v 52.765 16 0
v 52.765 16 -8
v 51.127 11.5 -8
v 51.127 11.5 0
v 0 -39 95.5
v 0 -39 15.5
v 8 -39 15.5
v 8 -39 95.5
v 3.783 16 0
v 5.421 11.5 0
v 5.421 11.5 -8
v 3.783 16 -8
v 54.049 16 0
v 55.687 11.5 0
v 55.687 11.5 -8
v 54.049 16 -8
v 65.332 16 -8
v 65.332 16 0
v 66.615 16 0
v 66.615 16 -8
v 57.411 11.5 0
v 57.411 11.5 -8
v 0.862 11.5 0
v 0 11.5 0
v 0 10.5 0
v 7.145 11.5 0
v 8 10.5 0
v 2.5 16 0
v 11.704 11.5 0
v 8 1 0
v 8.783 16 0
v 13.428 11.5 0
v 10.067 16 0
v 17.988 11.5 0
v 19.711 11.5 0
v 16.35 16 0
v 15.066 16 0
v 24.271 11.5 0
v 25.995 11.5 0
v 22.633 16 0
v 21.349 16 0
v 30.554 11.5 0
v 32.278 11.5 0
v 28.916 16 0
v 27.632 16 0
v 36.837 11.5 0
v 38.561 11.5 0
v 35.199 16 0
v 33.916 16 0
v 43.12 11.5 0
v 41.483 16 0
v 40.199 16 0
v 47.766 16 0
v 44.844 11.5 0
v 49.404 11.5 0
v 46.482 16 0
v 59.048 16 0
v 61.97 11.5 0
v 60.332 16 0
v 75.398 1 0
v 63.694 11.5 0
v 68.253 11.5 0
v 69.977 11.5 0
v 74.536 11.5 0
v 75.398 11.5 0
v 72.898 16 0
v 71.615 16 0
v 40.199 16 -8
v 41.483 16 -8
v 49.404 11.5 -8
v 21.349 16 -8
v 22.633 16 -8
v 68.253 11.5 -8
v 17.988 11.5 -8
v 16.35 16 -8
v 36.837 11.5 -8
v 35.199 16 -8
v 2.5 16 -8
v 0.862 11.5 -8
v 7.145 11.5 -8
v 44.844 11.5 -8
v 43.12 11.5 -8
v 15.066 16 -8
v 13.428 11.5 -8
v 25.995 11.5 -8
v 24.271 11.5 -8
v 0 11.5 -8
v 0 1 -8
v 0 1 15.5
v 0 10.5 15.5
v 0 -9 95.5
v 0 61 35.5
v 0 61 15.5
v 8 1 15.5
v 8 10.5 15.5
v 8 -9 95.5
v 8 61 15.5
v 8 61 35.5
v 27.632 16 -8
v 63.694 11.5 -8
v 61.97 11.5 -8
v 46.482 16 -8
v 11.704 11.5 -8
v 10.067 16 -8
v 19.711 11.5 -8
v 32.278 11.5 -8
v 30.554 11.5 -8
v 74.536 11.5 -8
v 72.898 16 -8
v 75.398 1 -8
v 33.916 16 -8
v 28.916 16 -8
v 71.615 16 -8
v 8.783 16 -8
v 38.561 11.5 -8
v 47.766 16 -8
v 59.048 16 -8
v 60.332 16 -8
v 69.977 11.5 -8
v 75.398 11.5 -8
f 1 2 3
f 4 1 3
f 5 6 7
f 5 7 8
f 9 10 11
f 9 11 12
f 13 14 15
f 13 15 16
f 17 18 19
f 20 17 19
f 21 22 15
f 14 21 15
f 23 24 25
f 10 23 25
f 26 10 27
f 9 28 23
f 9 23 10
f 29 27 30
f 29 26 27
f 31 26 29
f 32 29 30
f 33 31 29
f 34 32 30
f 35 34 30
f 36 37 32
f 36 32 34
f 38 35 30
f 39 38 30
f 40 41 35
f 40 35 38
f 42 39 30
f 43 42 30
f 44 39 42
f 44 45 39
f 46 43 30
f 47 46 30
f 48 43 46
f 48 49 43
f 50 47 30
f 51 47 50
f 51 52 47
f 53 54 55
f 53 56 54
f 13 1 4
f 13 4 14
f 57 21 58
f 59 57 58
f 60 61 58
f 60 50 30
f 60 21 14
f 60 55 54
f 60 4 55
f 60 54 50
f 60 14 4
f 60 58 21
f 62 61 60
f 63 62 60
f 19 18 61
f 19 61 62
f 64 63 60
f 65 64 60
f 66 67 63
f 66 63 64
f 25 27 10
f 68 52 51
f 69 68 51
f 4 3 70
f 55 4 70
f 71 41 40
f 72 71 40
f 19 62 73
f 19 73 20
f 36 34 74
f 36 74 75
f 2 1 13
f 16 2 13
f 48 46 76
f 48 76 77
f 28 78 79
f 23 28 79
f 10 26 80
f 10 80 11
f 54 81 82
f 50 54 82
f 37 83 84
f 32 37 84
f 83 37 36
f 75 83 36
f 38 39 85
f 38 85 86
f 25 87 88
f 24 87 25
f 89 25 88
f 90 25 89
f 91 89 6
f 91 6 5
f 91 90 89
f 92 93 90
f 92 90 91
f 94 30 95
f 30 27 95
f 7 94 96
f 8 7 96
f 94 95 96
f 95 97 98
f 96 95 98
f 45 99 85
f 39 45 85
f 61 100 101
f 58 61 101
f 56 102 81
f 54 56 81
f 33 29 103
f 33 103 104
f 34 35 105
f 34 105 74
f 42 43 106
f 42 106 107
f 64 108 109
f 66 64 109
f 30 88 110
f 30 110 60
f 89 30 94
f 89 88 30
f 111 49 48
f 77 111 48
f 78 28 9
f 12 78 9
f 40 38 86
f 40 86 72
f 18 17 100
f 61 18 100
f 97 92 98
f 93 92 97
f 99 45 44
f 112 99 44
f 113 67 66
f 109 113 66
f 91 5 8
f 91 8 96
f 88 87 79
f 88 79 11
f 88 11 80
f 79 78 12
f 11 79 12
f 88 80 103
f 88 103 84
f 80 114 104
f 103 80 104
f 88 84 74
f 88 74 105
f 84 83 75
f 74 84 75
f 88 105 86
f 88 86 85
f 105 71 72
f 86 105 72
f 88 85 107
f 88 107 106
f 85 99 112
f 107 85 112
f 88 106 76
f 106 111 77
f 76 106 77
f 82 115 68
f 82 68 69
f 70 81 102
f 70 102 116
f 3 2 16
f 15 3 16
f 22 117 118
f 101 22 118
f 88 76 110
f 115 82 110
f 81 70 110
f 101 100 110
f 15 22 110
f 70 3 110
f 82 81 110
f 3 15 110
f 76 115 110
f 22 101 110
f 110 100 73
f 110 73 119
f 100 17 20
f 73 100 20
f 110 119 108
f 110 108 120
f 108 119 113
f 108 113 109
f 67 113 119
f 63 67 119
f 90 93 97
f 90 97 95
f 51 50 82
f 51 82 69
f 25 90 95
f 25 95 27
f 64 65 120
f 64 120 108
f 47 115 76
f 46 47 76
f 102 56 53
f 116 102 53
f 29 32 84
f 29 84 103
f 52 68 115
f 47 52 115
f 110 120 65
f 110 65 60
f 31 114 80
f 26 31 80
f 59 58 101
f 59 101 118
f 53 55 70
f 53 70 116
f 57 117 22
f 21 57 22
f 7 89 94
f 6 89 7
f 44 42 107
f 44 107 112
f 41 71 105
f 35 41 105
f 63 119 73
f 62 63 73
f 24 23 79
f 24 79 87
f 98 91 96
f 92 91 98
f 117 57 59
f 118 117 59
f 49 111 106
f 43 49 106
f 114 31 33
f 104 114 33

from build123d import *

# Parameters (mm, degrees)
BLANKSKE_W          = 120
BLANKSKE_H          = 16
BLANK_DEPTH         = 8
TOOTHCUTSIM_DEPTH   = 122.326007105
TEETHCUTS_COUNT     = 20
TEETHCUTS_PITCH     = 6.2831853
SKETCH1_W           = 8
SKETCH1_H           = 1
CUT_EXTRUDE1_DEPTH  = 122.326007105
BOSS_EXTRUDE2_DEPTH = 8
CUT_EXTRUDE2_DEPTH  = 170.803562978


with BuildPart() as part:
    # BlankSke → Blank (new body)
    with BuildSketch(Plane.XY):
        with Locations((60, 8)):
            Rectangle(BLANKSKE_W, BLANKSKE_H)
    extrude(amount=-BLANK_DEPTH)

    # TooCutSkeSim → ToothCutSim (cut, through all)
    with BuildSketch(Plane.XY):
        Polygon((0.861870739, 11.5), (-0.861870739, 11.5), (-2.508981637, 16.0254), (2.508981637, 16.0254), align=None)
    toothcutsim = extrude(amount=-TOOTHCUTSIM_DEPTH, mode=Mode.SUBTRACT)

    # TeethCuts: ToothCutSim ×20
    with Locations(*[(i * TEETHCUTS_PITCH, 0, 0) for i in range(1, TEETHCUTS_COUNT)]):
        add(toothcutsim, mode=Mode.SUBTRACT)

    # Sketch1 → Cut-Extrude1 (cut, through all)
    with BuildSketch(Plane(origin=(120, 0, 0), x_dir=(0, 0, -1), z_dir=(1, 0, 0))):
        with Locations((4, 0.5)):
            Rectangle(SKETCH1_W, SKETCH1_H)
    extrude(amount=-CUT_EXTRUDE1_DEPTH, mode=Mode.SUBTRACT)

    # Sketch3 → Boss-Extrude2 (add)
    with BuildSketch(Plane.ZY):
        Polygon((0, 1), (15.5, 1), (15.5, -39), (95.5, -39), (95.5, -9), (35.5, 61), (15.5, 61), (15.5, 10.5), (0, 10.5), align=None)
    extrude(amount=-BOSS_EXTRUDE2_DEPTH)

    # Sketch4 → Cut-Extrude2 (cut, through all)
    with BuildSketch(Plane(origin=(0, 0, -8), x_dir=(-1, 0, 0), z_dir=(0, 0, -1))):
        Polygon((-120, 11.5), (-118.518649961, 11.5), (-116.880783906, 16), (-115.597072194, 16), (-113.959206139, 11.5), (-113.218706139, 11.5), (-112.235464661, 11.5), (-110.597598606, 16), (-109.313886894, 16), (-107.676020839, 11.5), (-105.952279361, 11.5), (-104.314413306, 16), (-103.030701594, 16), (-101.392835539, 11.5), (-99.669094061, 11.5), (-98.031228006, 16), (-96.747516294, 16), (-95.109650239, 11.5), (-93.385908761, 11.5), (-91.748042706, 16), (-90.464330994, 16), (-88.826464939, 11.5), (-87.102723461, 11.5), (-85.464857406, 16), (-84.181145694, 16), (-82.543279639, 11.5), (-80.819538161, 11.5), (-79.181672106, 16), (-77.897960394, 16), (-76.260094339, 11.5), (-75.3982236, 11.5), (-75.3982236, 1), (-76.260094339, 1), (-101.392835539, 1), (-113.218706139, 1), (-120, 1), align=None)
    extrude(amount=-CUT_EXTRUDE2_DEPTH, mode=Mode.SUBTRACT)


solid = part.part
